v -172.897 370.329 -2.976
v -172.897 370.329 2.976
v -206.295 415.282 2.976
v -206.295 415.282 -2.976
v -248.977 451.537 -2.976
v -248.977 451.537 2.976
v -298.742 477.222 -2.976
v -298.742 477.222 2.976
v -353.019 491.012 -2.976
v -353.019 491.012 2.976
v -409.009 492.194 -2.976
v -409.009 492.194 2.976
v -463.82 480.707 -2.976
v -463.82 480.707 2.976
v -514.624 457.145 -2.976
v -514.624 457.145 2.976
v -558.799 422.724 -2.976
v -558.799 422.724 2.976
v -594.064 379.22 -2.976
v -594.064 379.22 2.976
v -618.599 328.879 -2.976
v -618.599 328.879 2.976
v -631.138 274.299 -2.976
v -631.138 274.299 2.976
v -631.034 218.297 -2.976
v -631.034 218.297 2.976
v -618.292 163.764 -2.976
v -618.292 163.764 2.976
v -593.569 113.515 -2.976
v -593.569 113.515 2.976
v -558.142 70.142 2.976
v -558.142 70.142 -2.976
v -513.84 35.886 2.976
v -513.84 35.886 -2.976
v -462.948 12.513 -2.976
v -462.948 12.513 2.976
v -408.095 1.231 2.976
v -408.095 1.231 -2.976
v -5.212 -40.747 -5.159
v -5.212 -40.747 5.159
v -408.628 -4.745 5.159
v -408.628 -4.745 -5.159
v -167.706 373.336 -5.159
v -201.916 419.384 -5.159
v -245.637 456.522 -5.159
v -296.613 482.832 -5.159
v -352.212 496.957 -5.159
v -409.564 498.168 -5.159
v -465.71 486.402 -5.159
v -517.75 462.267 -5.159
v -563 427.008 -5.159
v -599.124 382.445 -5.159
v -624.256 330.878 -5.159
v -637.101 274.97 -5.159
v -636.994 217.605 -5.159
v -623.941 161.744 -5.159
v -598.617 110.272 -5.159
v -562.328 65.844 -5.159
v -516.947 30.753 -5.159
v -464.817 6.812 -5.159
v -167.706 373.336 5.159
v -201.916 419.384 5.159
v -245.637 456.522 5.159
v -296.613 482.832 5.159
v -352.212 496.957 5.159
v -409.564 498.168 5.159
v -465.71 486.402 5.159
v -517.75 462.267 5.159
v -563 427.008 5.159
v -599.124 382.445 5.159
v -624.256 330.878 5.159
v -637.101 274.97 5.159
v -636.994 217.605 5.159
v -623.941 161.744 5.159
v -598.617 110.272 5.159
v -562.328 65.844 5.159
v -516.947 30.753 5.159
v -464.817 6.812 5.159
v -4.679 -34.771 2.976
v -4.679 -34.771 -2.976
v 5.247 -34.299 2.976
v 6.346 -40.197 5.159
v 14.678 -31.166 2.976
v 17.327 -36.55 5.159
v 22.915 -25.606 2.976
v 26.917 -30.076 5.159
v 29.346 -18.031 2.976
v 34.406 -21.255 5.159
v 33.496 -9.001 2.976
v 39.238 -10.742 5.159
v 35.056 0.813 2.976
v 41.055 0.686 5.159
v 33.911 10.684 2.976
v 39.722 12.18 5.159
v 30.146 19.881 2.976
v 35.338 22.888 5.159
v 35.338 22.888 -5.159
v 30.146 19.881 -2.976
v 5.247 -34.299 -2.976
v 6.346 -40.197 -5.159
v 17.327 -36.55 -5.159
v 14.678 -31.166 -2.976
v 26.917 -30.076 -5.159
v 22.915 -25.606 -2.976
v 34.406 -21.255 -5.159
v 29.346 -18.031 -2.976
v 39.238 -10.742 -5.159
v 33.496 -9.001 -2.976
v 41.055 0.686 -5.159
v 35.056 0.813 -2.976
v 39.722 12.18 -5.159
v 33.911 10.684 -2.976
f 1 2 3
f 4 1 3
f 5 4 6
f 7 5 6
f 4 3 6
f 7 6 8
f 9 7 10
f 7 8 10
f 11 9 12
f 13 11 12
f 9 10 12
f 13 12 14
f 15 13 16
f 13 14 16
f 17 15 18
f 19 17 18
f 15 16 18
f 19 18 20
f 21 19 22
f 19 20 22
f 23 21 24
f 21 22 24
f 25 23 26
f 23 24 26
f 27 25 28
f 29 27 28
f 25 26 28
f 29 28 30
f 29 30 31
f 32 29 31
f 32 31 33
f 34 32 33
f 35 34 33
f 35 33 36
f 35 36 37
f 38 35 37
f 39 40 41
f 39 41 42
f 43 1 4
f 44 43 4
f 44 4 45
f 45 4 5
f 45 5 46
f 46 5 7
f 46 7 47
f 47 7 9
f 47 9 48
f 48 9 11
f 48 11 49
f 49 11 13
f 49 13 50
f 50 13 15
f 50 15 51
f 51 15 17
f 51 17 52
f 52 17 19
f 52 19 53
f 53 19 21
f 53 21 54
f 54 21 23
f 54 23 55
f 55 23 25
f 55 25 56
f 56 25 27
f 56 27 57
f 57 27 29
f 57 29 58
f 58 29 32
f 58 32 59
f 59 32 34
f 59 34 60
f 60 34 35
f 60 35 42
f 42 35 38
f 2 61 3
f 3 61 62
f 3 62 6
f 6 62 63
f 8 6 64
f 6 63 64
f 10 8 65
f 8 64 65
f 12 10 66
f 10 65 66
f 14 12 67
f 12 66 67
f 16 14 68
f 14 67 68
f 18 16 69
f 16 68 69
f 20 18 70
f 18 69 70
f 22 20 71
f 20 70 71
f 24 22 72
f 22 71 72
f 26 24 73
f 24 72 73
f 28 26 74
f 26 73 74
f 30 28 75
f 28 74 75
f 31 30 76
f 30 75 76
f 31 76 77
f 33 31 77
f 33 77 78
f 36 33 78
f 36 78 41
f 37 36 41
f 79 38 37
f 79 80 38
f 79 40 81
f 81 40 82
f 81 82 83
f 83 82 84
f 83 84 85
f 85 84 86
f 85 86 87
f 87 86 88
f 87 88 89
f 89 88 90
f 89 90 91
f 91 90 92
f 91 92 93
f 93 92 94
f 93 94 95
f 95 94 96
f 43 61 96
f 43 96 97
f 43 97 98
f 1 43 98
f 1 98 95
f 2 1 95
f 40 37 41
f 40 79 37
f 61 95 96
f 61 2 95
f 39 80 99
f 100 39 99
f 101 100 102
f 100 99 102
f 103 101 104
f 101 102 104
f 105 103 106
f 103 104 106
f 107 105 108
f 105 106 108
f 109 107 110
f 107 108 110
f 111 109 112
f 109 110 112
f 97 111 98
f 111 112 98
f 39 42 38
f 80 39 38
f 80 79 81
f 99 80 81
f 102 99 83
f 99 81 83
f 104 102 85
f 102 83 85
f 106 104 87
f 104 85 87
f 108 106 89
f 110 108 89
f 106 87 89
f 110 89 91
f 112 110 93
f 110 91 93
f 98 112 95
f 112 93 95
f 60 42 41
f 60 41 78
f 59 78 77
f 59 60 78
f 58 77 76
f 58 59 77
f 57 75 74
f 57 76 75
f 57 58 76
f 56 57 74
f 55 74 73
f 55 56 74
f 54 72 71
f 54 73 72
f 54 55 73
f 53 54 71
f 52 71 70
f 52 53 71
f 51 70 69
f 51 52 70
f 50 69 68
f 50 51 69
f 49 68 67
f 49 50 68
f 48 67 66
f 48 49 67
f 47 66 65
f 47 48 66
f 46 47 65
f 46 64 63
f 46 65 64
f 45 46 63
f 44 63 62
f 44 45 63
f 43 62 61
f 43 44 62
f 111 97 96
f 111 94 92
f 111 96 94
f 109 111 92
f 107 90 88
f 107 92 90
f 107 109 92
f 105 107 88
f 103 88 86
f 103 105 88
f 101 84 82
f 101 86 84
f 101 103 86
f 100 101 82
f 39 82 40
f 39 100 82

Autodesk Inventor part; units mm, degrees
ref_plane "YZ Plane" through (0, 0, 0) normal (1, 0, 0) x (0, 1, 0)
ref_plane "XZ Plane" through (0, 0, 0) normal (0, 1, 0) x (-1, 0, 0)
sketch "Sketch Path" plane through (0, 0, 0) normal (0, 0, 1) x (1, 0, 0)
  arc A0 (-4.9901, -38.2586) -> (33.176, 21.6358) centre (-1.4345, 1.5831) ccw
  arc A1 (-169.8676, 372.0838) -> (-408.4059, -2.2563) centre (-386.1833, 246.7541) ccw
  line L0 (-169.8676, 372.0838) -> (33.176, 21.6358)
  line L1 (-4.9901, -38.2586) -> (-408.4059, -2.2563)
ref_plane "Cross Section Plane" through (33.176, 21.6358, 0) normal (-0.5013, 0.8653, 0) x (0, 0, 1)
sketch "Cross Section" plane through (33.176, 21.6358, 0) normal (-0.5013, 0.8653, 0) x (0, 0, 1)
  line L0 (0, 2.4986) -> (0, -3.5014) construction
  line L1 (-4.25, 0) -> (4.25, 0) construction
  line L2 (-5.1594, 2.4986) -> (5.1594, 2.4986)
  line L3 (5.1594, 2.4986) -> (2.9756, -3.5014)
  line L4 (2.9756, -3.5014) -> (-2.9756, -3.5014)
  line L5 (-2.9756, -3.5014) -> (-5.1594, 2.4986)
  point P0 (0, 0)
  point P1 (0, 0)
  point P2 (0, 0)
  dimension "d0" = 8.5
  dimension "d1" = 2.4986
  dimension "d2" = 40
  dimension "d3" = 6
sweep "Belt" add profiles "Cross Section" path "Sketch Path"
equation "\"d0\" = da_Bw"
equation "\"d1\" = da_Hw"
equation "\"d2\" = da_Alfa"
equation "\"d3\" = da_H"
equation "\"da_Alfa\" = 40deg"
equation "\"da_H\" = 6"
equation "\"da_Bw\" = 8.5"
equation "\"da_Hw\" = 2.49859"
properties part number "V-Belt" material "Rubber"
